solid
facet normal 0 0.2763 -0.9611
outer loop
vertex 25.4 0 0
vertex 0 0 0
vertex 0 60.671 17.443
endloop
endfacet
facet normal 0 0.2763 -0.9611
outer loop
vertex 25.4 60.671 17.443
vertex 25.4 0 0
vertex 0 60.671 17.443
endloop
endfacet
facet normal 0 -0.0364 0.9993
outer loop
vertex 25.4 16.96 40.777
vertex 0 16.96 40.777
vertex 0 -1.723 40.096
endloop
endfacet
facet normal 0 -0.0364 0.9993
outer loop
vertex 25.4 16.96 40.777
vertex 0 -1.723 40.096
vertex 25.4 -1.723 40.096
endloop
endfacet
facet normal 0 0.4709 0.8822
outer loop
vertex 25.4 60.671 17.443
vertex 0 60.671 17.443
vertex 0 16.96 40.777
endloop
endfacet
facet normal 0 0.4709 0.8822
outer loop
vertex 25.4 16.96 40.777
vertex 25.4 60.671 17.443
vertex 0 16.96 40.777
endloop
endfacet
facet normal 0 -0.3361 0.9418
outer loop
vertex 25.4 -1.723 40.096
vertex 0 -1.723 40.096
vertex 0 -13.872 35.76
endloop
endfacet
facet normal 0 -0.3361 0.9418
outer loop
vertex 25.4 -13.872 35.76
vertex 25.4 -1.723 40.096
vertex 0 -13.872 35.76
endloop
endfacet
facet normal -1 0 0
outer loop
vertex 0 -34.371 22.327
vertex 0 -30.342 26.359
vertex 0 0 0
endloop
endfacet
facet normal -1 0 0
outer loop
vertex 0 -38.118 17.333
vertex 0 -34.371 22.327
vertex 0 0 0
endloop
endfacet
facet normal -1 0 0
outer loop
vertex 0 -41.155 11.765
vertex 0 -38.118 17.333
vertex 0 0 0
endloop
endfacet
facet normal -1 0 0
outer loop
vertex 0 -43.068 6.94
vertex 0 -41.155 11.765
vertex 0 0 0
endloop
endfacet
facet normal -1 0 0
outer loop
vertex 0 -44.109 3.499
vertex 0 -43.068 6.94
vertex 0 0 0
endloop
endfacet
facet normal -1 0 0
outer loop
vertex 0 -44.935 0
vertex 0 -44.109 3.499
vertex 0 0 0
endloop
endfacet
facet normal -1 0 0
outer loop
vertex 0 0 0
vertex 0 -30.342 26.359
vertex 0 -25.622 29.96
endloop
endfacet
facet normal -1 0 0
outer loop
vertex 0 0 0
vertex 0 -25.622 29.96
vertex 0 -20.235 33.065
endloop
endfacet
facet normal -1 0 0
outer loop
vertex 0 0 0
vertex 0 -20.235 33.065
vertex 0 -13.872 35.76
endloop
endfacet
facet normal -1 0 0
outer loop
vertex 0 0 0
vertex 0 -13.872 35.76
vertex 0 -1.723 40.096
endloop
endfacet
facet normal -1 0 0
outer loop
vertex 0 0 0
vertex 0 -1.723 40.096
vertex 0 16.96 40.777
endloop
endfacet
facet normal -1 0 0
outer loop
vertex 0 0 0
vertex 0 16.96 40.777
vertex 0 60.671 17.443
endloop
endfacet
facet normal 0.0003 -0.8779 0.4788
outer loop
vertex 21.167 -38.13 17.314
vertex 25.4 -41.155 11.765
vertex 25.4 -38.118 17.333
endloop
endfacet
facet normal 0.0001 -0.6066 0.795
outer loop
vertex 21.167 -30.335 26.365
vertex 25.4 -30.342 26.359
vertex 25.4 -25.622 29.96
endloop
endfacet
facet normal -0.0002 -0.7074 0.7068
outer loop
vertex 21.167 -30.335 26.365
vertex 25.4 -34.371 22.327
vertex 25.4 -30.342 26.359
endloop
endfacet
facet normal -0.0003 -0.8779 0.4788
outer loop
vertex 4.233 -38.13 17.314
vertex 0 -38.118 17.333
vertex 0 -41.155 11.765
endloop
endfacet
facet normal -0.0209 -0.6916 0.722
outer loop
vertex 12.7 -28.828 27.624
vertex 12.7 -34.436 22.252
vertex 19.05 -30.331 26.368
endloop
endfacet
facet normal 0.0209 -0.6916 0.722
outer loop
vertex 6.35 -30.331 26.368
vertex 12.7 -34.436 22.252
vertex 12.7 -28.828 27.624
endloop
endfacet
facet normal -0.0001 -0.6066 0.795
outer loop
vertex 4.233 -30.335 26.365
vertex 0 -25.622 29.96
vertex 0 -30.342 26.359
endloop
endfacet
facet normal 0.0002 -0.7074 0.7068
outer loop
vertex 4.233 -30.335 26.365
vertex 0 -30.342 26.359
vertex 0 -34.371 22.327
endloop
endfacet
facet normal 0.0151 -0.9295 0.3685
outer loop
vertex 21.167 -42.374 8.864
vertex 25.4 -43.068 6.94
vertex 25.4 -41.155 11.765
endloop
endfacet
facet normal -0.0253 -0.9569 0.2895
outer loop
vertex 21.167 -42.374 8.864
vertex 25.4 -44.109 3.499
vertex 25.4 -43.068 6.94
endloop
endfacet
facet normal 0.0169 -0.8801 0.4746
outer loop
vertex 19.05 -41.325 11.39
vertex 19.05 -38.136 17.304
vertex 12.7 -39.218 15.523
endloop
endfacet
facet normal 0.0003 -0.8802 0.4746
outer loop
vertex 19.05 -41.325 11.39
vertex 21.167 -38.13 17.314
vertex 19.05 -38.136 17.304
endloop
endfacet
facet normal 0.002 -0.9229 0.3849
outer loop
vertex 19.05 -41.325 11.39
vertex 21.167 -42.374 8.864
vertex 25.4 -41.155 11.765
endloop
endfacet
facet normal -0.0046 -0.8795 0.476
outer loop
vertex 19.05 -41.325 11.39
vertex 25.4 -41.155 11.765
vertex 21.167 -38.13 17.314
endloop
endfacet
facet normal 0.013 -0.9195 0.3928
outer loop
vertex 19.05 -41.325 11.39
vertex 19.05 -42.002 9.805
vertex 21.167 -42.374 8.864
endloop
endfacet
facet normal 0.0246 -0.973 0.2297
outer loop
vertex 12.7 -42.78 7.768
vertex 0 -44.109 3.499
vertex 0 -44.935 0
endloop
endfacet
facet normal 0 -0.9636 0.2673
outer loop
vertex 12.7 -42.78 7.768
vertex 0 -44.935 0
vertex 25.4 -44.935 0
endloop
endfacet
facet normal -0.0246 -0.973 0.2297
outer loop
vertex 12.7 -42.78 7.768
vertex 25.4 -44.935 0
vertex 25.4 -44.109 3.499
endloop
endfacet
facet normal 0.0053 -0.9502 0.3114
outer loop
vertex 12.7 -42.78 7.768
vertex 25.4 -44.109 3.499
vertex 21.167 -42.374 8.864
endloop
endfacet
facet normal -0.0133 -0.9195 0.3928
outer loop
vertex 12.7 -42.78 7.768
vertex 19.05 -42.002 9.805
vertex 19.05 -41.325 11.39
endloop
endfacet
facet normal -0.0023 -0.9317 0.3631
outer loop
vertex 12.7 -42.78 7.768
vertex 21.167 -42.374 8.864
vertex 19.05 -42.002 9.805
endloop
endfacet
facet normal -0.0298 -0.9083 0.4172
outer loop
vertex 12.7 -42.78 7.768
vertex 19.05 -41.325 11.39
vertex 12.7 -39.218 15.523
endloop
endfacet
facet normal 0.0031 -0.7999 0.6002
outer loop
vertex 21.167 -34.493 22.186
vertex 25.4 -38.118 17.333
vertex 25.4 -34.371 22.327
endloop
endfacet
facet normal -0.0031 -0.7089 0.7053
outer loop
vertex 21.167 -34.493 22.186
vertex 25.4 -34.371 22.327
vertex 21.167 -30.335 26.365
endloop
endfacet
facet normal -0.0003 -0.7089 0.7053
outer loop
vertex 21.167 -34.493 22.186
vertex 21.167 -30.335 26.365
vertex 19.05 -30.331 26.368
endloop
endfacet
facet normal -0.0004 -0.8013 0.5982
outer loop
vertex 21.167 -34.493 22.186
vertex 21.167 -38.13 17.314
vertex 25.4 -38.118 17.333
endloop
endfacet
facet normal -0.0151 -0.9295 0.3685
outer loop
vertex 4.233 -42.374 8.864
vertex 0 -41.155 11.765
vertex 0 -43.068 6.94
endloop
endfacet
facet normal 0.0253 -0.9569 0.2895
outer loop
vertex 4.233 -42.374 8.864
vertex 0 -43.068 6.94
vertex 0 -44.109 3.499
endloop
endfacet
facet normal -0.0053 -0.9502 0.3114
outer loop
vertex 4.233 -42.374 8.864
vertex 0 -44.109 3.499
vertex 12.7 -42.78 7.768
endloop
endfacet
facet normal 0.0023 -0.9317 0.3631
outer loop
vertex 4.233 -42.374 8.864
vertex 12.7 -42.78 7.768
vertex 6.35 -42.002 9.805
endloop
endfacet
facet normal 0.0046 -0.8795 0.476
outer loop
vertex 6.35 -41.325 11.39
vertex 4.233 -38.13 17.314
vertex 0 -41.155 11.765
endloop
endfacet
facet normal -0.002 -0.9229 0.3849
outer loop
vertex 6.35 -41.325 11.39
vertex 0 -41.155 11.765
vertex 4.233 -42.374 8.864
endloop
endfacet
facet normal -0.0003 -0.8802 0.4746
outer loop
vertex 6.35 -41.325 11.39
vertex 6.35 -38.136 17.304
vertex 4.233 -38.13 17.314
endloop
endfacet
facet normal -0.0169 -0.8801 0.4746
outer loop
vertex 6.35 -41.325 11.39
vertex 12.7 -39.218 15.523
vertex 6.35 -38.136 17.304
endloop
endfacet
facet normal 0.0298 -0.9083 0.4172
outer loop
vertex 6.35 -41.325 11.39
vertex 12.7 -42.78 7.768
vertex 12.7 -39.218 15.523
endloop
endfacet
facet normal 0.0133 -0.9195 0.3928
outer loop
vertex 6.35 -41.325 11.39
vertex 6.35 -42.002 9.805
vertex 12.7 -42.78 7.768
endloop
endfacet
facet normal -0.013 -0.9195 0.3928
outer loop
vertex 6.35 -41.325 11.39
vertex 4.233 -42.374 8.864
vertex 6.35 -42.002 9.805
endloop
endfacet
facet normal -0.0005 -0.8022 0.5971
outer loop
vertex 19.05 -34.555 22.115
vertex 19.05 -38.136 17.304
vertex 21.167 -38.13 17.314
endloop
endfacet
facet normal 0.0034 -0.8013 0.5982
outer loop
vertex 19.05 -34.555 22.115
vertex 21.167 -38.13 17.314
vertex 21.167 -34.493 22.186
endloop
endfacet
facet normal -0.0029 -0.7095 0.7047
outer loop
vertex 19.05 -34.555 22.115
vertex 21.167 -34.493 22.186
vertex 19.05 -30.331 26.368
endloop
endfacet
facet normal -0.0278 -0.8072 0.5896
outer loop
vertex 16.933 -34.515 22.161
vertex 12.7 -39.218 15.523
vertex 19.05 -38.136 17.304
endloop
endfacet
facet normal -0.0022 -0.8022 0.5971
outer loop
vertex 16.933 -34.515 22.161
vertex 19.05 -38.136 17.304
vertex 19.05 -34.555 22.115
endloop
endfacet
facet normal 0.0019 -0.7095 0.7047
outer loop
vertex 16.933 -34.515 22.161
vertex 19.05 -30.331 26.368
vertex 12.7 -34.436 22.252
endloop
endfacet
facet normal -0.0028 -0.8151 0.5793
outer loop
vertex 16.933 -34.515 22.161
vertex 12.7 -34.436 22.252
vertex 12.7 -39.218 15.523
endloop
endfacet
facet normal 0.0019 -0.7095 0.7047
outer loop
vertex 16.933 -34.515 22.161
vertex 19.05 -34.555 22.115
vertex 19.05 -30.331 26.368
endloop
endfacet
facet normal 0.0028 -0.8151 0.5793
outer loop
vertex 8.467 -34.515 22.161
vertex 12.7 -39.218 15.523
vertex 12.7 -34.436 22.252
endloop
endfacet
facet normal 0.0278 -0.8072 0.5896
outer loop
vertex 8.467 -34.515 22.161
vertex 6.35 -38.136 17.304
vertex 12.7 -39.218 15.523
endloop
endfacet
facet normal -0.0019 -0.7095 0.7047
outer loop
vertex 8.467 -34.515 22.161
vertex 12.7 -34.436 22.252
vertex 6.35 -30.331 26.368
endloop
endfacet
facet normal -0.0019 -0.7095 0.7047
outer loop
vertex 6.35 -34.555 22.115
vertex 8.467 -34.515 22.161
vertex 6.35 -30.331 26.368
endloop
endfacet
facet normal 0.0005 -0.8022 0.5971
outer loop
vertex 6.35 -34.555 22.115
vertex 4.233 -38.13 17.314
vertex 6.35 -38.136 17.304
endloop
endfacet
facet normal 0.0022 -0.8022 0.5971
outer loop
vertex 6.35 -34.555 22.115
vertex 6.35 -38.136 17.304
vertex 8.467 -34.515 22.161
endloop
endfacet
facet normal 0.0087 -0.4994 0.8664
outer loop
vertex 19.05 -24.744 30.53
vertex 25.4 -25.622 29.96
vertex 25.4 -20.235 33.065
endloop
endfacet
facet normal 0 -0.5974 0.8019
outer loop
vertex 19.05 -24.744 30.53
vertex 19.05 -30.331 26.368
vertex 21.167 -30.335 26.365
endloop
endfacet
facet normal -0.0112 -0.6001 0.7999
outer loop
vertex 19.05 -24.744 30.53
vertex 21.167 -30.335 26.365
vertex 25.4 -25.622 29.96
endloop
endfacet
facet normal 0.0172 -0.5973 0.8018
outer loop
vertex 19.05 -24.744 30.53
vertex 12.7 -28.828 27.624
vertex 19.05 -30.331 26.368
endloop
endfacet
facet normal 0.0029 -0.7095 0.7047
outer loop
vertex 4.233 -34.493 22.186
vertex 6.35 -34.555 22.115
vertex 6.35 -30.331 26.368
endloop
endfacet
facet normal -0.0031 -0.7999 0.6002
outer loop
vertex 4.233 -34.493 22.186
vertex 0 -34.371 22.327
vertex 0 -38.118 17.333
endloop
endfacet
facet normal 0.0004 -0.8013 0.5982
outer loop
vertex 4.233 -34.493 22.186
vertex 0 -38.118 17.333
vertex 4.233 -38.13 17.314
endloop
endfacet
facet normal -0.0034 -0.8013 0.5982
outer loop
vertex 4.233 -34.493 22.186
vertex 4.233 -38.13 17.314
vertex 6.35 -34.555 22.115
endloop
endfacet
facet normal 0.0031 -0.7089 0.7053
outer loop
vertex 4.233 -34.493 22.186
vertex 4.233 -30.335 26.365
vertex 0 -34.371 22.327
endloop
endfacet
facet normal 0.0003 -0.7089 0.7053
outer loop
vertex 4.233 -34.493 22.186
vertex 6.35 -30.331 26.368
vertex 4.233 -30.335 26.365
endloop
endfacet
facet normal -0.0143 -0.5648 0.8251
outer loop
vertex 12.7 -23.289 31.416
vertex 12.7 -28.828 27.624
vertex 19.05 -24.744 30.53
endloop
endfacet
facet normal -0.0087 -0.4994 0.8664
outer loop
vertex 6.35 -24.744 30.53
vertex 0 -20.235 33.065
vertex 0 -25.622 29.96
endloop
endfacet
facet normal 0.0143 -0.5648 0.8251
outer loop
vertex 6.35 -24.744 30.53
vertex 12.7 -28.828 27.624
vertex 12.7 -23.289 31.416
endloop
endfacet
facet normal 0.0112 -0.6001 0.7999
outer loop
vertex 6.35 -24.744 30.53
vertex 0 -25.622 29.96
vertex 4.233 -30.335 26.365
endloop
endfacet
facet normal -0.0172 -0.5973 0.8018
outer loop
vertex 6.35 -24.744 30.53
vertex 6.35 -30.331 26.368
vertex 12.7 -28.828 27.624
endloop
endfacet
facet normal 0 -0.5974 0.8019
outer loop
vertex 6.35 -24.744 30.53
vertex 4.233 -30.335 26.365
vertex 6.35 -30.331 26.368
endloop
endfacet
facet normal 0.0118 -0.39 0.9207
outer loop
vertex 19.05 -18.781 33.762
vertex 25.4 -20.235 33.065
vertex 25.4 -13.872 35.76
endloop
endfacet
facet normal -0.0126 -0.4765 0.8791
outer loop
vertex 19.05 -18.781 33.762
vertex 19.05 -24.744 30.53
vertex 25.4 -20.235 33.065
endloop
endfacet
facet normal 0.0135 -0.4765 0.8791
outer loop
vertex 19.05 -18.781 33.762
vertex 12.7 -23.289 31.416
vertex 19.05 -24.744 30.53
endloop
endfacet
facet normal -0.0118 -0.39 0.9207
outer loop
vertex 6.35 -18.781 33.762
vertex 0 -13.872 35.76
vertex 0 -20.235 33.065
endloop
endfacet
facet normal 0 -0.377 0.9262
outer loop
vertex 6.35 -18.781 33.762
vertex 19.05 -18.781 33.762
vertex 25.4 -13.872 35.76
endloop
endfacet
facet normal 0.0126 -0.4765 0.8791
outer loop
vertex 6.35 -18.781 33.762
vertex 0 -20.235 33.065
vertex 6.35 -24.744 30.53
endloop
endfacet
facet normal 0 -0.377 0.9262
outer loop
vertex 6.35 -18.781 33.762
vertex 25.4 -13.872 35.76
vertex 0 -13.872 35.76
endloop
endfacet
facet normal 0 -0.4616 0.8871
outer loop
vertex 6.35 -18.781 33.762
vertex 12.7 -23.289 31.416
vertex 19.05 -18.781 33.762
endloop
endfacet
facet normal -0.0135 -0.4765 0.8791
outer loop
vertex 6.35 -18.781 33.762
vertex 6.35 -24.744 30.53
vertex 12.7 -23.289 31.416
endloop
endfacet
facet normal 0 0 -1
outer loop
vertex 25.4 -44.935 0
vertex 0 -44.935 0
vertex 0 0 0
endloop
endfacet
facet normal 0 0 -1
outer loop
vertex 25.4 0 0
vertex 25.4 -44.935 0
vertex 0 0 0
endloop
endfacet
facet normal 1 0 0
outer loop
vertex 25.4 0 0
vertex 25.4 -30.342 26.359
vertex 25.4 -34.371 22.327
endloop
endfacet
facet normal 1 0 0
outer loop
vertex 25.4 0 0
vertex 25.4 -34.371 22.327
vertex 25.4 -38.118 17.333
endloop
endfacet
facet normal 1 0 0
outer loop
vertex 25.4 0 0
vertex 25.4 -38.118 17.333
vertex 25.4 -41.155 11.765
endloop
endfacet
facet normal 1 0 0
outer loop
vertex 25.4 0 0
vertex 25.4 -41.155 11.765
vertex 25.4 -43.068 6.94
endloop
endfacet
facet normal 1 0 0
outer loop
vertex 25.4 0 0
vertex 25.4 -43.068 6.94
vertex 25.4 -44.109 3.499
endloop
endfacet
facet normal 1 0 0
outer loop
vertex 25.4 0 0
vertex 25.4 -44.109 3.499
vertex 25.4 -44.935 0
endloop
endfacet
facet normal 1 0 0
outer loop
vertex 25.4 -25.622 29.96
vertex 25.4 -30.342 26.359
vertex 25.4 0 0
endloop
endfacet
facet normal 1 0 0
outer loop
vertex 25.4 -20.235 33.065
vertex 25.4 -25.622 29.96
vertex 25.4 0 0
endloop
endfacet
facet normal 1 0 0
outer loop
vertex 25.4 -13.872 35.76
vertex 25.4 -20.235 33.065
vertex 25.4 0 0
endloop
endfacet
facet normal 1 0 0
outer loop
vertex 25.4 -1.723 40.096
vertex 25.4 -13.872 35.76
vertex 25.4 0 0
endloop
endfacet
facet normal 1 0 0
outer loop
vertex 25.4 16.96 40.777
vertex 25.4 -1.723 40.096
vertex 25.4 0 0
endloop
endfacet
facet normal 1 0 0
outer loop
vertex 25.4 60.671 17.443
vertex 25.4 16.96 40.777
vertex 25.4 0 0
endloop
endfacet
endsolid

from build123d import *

# Parameters (mm, degrees)
F1_DEPTH    = 25.4
F2_T1_DEPTH = 238.6235911332
F3_SIZE2    = 7.62
F3_SIZE     = 12.7


# Not quite as in the source:
# - a fillet or chamfer that OpenCascade refuses, or shapes differently, is made with other operations: its cross-section is extruded or revolved along the edge and cut away or added


with BuildPart() as f1:
    # F0 (on Right) → F1 (new body)
    with BuildSketch(Plane.YZ):
        Polygon((-44.9345260859, 0), (0, 0), (60.6710910797, 17.4429379404), (10.2382460609, 44.3657338619), (-54.0351904929, 21.4244797826), align=None)
    extrude(amount=F1_DEPTH)

    # F2: fillet of radius 48.2774474346 on 1 edges, made by hand

    # F2_s2 → F2_t1 (cut)
    with BuildSketch(Plane.YZ.offset(-106.6117955666)):
        with BuildLine():
            add(Edge.make_bspline(
                [(-44.9345260859, 0), (-39.4692303476, 26.6235388421), (-13.8721919012, 35.7599440845)],
                knots=[0, 0, 0, 1, 1, 1], degree=2, weights=[1, 1, 1]))
            Line((-13.8721919012, 35.7599440845), (-54.0351904929, 21.4244797826))
            Line((-54.0351904929, 21.4244797826), (-44.9345260859, 0))
        make_face()
    extrude(amount=F2_T1_DEPTH, mode=Mode.SUBTRACT)

    # F3
    f3_edges = [f1.edges().sort_by_distance(p)[0] for p in [
        (12.7, 10.238246, 44.365734),
    ]]
    f3_side = f1.faces().sort_by_distance((12.7, -1.816973, 40.062839))[0]
    chamfer(f3_edges, length=F3_SIZE, length2=F3_SIZE2, reference=f3_side)


solid = f1.part
